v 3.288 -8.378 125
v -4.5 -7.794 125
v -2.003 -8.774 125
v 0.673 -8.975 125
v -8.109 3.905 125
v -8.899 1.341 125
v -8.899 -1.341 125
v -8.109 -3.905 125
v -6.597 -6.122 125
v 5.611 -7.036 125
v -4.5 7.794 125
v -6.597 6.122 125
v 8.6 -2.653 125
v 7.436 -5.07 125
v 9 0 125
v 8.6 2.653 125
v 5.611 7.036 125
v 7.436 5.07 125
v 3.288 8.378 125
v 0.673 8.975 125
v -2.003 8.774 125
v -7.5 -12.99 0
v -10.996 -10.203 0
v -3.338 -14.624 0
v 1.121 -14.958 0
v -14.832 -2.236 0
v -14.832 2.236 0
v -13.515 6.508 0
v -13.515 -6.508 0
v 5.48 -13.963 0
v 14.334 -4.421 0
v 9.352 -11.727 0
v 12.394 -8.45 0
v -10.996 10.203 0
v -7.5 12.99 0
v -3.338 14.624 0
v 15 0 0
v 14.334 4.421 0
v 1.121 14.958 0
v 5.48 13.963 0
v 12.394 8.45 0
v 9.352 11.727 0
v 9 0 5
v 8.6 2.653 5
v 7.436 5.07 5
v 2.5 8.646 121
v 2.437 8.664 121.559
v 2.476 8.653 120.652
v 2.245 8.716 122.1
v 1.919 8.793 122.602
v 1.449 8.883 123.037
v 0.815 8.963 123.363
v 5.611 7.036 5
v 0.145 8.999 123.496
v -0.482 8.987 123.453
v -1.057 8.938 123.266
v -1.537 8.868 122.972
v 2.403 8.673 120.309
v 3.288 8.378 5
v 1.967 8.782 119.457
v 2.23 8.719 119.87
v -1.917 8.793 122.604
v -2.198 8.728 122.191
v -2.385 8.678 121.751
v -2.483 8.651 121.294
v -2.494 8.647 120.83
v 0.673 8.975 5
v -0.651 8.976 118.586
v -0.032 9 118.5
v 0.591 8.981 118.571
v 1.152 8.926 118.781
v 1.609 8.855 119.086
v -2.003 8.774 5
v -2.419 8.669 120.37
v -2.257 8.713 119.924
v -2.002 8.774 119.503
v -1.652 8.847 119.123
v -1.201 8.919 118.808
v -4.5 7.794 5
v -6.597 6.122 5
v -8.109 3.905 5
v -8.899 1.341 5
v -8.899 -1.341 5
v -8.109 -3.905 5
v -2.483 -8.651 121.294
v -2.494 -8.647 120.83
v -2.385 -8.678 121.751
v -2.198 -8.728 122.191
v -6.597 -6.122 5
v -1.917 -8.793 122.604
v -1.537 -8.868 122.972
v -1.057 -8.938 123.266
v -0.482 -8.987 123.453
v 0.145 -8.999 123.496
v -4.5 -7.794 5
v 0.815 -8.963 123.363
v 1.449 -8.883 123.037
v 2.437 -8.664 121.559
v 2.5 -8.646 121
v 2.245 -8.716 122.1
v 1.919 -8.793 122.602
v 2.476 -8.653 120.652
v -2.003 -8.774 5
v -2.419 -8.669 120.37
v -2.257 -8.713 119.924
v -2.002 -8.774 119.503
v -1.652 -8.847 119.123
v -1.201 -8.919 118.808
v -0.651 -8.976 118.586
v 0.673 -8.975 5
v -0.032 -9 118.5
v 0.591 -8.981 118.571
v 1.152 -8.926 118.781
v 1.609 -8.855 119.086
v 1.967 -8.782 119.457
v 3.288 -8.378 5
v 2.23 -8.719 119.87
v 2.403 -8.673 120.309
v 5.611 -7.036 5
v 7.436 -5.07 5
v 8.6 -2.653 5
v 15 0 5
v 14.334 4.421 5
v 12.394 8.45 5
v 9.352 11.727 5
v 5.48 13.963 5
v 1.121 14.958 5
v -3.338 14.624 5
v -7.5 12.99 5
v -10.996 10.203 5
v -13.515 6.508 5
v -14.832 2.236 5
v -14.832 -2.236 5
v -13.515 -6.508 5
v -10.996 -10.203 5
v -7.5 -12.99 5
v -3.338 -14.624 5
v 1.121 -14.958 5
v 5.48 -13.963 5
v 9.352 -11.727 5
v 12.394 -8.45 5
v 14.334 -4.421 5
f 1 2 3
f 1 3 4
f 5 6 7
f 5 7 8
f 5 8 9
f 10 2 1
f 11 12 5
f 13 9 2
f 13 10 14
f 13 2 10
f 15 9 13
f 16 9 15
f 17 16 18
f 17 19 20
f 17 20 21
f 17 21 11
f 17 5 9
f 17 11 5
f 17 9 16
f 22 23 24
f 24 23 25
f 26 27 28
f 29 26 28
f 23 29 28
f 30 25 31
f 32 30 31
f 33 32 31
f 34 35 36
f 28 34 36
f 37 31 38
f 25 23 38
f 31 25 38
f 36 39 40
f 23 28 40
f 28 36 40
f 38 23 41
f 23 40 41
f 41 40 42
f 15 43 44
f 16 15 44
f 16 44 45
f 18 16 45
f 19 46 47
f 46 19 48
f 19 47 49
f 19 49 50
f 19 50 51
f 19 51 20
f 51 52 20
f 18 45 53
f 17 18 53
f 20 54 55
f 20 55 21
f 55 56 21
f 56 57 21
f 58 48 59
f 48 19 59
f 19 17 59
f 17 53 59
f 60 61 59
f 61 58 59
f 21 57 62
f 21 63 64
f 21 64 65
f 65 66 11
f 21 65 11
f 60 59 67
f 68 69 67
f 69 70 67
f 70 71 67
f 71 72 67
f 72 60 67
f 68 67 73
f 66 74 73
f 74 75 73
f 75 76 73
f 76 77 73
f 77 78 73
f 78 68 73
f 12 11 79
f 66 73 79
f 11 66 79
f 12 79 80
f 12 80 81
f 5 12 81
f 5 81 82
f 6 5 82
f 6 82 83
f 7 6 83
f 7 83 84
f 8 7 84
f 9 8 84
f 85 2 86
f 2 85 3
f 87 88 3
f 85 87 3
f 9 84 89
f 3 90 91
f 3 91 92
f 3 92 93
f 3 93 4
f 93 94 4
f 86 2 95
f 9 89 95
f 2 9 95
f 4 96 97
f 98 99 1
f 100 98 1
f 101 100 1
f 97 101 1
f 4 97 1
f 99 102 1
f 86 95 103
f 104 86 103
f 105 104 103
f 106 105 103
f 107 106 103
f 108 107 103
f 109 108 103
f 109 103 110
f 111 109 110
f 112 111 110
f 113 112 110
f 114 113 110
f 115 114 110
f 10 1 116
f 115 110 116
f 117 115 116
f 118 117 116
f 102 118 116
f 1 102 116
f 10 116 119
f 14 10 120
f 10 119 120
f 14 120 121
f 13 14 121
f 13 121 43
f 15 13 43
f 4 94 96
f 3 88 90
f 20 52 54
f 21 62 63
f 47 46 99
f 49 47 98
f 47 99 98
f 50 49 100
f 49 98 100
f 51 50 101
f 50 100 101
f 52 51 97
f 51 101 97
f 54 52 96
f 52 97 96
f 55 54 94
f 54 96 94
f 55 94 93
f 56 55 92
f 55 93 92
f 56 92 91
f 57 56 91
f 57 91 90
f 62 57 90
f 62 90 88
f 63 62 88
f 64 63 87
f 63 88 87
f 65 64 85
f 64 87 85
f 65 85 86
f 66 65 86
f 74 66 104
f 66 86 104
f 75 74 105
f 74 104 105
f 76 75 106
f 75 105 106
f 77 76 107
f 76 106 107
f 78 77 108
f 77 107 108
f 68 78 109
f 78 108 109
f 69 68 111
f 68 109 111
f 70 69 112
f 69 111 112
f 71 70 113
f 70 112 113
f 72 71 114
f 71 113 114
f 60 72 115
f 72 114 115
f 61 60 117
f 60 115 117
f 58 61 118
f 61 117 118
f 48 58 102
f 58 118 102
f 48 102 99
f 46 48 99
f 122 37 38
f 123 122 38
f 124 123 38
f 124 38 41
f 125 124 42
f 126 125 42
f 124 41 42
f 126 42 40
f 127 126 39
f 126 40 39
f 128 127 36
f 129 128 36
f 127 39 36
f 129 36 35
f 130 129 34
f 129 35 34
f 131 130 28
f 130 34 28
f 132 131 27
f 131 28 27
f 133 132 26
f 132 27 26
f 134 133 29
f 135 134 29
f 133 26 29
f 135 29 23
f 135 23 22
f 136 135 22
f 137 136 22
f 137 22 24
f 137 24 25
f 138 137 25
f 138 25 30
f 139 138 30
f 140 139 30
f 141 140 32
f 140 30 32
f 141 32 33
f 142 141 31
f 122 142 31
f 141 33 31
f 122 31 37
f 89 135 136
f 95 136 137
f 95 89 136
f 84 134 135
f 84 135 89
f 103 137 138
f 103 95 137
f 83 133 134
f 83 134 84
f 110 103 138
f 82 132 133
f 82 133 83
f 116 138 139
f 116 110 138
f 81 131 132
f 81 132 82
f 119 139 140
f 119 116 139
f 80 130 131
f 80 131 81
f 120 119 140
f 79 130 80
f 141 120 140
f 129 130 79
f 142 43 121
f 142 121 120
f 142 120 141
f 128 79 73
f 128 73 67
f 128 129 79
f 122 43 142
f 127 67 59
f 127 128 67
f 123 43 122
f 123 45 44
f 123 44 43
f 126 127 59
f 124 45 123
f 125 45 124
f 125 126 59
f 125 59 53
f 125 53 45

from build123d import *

# Parameters (mm, degrees)
F0_R     = 9
F1_DEPTH = 125
F2_R     = 15
F3_DEPTH = 5
F4_R     = 2.5
F5_DEPTH = 12.5


with BuildPart() as f1:
    # F0 (on Top) → F1 (new body)
    with BuildSketch(Plane.XY):
        Circle(F0_R)
    extrude(amount=F1_DEPTH)

    # F2 (on Top) → F3 (join)
    with BuildSketch(Plane.XY):
        Circle(F2_R)
    extrude(amount=F3_DEPTH)

    # F4 (on Front) → F5 (cut, symmetric)
    with BuildSketch(Plane.XZ):
        with Locations((0, 121)):
            Circle(F4_R)
    extrude(amount=F5_DEPTH, both=True, mode=Mode.SUBTRACT)


solid = f1.part
